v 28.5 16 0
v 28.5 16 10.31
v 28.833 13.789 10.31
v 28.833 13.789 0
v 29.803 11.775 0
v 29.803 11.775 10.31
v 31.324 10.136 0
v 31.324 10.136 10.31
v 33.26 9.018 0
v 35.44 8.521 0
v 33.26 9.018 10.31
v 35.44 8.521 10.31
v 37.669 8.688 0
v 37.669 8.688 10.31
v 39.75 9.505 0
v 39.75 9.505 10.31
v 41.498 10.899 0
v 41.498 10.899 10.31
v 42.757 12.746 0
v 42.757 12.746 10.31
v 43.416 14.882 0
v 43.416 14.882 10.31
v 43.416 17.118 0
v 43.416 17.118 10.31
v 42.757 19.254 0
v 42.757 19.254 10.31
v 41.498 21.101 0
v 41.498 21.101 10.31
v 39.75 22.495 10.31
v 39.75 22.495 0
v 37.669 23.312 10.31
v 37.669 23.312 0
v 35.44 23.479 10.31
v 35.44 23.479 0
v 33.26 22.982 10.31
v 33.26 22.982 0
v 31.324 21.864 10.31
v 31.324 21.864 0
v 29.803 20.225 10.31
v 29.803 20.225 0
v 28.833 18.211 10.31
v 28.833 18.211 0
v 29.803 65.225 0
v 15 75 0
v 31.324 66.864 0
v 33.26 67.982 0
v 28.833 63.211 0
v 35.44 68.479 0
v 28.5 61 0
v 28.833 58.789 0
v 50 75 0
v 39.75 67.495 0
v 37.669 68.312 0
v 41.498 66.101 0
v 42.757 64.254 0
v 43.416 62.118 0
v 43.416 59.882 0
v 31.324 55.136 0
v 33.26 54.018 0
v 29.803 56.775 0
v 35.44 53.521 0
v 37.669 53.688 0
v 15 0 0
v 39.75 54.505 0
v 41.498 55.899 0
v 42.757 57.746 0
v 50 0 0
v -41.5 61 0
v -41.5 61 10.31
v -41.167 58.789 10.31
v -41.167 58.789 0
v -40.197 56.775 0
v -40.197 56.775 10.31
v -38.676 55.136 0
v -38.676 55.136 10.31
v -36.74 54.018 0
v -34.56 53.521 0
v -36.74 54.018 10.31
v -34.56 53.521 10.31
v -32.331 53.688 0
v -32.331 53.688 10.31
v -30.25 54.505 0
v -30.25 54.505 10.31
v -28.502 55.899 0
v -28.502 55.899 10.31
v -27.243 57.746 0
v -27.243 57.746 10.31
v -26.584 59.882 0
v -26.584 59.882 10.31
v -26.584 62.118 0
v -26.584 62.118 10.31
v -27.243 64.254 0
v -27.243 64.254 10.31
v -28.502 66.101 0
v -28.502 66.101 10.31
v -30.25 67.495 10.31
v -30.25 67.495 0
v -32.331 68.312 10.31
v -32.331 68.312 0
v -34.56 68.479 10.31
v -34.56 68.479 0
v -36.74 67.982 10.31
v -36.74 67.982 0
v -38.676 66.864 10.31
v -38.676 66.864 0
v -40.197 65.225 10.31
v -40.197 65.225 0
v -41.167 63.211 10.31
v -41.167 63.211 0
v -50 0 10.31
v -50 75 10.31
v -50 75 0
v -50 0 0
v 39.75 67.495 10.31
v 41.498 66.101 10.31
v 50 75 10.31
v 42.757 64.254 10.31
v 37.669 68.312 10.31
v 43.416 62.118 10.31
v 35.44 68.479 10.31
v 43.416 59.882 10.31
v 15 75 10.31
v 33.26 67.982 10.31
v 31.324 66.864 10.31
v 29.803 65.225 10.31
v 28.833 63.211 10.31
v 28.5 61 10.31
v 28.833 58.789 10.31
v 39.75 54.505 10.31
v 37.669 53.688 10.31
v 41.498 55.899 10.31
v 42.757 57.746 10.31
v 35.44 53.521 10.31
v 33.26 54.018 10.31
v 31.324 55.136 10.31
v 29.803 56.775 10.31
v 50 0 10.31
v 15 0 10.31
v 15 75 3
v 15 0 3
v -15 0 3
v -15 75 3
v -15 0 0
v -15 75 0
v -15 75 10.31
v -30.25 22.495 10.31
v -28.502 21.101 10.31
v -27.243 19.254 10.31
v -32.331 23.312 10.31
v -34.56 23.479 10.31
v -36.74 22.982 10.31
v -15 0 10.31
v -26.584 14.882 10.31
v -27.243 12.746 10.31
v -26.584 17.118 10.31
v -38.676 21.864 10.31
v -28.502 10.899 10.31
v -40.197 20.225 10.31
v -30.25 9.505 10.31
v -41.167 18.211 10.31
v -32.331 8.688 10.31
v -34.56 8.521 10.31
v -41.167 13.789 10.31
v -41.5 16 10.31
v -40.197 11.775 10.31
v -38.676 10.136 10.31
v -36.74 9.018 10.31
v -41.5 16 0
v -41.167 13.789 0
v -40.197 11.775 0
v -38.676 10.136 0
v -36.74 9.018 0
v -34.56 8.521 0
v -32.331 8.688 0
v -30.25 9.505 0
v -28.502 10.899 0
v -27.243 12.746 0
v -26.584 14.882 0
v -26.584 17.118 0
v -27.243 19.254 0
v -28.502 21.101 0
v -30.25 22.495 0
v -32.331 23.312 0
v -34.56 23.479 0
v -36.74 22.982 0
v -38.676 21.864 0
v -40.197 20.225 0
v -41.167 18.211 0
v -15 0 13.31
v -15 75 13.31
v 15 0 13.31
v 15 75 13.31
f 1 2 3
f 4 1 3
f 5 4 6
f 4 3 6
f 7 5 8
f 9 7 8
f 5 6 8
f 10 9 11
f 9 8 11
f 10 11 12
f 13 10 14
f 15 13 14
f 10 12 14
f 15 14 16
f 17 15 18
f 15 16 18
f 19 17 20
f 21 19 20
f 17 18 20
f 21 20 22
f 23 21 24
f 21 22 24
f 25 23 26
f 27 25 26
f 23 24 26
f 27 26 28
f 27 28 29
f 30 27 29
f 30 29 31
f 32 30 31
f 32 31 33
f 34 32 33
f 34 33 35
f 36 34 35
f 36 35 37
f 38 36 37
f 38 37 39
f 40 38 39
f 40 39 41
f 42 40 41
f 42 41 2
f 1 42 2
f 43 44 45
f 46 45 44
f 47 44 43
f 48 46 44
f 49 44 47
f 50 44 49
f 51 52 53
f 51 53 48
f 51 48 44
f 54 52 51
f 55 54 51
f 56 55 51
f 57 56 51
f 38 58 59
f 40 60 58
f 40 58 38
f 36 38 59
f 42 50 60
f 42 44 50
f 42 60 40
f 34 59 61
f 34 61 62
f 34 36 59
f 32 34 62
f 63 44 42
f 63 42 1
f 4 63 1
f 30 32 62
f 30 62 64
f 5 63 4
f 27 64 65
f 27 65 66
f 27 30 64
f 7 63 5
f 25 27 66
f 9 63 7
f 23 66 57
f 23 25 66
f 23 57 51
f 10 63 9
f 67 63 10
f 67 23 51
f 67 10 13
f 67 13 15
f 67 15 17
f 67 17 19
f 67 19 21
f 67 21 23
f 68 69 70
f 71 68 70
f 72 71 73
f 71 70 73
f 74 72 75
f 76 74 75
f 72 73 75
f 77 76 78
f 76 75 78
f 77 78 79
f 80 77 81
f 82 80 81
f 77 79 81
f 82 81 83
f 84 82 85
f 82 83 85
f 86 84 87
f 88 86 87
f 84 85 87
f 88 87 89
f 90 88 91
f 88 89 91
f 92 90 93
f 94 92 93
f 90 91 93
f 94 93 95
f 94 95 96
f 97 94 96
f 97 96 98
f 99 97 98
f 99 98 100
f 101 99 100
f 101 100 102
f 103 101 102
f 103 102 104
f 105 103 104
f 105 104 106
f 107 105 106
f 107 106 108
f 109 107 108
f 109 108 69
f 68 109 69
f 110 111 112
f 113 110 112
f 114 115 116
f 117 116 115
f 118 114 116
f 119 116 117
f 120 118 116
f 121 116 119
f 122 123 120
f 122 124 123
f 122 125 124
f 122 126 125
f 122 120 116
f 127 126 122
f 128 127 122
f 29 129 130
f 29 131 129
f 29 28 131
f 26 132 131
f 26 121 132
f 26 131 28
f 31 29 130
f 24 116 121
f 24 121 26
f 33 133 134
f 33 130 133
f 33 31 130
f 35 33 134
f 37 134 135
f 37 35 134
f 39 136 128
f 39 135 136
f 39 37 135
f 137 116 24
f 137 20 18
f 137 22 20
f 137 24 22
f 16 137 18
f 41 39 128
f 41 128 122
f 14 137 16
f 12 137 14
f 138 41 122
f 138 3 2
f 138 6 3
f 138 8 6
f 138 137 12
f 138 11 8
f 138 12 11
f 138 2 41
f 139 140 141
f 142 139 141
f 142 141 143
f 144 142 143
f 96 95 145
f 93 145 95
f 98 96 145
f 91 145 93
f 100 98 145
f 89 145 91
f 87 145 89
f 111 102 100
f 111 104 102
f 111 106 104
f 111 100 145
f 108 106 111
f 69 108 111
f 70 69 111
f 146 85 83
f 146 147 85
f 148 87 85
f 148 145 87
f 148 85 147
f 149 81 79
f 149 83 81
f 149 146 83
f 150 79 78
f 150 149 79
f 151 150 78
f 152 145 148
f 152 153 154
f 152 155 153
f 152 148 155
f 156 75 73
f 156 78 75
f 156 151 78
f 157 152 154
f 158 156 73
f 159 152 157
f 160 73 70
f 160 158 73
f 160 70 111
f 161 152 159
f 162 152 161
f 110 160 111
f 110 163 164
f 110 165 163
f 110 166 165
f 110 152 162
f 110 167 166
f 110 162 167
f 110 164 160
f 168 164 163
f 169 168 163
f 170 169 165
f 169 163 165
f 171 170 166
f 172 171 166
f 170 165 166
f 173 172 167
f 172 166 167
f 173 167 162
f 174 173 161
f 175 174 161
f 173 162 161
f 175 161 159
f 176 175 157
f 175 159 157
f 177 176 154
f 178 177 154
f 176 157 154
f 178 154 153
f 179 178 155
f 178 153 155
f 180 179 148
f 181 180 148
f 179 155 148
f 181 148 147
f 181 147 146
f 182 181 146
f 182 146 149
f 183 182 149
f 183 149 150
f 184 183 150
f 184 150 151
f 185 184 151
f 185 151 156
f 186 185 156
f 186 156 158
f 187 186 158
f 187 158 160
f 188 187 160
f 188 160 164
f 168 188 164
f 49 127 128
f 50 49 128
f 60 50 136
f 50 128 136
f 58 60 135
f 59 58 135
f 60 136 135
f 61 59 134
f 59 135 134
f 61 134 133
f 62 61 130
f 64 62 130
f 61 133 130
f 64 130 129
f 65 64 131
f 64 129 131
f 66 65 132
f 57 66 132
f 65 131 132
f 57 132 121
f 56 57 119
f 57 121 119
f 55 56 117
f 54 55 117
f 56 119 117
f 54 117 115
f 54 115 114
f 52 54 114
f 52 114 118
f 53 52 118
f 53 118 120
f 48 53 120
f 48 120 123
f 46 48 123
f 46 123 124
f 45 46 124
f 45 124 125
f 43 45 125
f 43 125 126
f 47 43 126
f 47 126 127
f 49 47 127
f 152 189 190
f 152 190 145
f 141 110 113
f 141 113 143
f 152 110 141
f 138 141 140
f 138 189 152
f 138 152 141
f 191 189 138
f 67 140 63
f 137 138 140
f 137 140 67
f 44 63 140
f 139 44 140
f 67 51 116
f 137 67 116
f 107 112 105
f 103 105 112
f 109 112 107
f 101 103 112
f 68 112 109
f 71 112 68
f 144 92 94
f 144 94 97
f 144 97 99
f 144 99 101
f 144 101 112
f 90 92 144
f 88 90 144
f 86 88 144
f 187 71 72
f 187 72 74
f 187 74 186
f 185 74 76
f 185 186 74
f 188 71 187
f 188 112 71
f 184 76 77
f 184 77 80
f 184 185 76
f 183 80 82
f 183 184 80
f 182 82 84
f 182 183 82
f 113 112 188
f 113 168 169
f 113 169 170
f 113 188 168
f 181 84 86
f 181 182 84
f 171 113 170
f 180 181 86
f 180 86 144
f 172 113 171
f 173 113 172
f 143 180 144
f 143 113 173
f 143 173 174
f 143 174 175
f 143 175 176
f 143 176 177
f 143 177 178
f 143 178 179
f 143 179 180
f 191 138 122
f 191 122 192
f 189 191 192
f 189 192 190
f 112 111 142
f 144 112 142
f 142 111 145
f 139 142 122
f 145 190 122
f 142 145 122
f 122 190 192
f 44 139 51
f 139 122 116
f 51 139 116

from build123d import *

# Parameters (mm, degrees)
F1_DEPTH = 75
F4_DEPTH = 75.001
F7_DEPTH = 75
F9_D     = 15


with BuildPart() as f1:
    # F0 (on Front) → F1 (new body)
    with BuildSketch(Plane.XZ):
        Polygon((-50, 0), (0, 0), (50, 0), (50, 10.31), (-50, 10.31), align=None)
    extrude(amount=-F1_DEPTH)

    # F3 (on offset) → F4 (cut, through all)
    with BuildSketch(Plane.XZ):
        Polygon((-15, 0), (0, 0), (15, 0), (15, 3), (-15, 3), align=None)
    extrude(amount=-F4_DEPTH, mode=Mode.SUBTRACT)

    # F6 (on offset) → F7 (join)
    with BuildSketch(Plane.XZ):
        Polygon((-15, 10.31), (0, 10.31), (15, 10.31), (15, 13.31), (-15, 13.31), align=None)
    extrude(amount=-F7_DEPTH)

    # F9 (through all)
    with Locations(Plane(origin=(0, 0, 0), x_dir=(1, 0, 0), z_dir=(0, 0, -1))):
        with Locations((-34, -61), (-34, -16), (36, -61), (36, -16)):
            Hole(F9_D / 2)


solid = f1.part
